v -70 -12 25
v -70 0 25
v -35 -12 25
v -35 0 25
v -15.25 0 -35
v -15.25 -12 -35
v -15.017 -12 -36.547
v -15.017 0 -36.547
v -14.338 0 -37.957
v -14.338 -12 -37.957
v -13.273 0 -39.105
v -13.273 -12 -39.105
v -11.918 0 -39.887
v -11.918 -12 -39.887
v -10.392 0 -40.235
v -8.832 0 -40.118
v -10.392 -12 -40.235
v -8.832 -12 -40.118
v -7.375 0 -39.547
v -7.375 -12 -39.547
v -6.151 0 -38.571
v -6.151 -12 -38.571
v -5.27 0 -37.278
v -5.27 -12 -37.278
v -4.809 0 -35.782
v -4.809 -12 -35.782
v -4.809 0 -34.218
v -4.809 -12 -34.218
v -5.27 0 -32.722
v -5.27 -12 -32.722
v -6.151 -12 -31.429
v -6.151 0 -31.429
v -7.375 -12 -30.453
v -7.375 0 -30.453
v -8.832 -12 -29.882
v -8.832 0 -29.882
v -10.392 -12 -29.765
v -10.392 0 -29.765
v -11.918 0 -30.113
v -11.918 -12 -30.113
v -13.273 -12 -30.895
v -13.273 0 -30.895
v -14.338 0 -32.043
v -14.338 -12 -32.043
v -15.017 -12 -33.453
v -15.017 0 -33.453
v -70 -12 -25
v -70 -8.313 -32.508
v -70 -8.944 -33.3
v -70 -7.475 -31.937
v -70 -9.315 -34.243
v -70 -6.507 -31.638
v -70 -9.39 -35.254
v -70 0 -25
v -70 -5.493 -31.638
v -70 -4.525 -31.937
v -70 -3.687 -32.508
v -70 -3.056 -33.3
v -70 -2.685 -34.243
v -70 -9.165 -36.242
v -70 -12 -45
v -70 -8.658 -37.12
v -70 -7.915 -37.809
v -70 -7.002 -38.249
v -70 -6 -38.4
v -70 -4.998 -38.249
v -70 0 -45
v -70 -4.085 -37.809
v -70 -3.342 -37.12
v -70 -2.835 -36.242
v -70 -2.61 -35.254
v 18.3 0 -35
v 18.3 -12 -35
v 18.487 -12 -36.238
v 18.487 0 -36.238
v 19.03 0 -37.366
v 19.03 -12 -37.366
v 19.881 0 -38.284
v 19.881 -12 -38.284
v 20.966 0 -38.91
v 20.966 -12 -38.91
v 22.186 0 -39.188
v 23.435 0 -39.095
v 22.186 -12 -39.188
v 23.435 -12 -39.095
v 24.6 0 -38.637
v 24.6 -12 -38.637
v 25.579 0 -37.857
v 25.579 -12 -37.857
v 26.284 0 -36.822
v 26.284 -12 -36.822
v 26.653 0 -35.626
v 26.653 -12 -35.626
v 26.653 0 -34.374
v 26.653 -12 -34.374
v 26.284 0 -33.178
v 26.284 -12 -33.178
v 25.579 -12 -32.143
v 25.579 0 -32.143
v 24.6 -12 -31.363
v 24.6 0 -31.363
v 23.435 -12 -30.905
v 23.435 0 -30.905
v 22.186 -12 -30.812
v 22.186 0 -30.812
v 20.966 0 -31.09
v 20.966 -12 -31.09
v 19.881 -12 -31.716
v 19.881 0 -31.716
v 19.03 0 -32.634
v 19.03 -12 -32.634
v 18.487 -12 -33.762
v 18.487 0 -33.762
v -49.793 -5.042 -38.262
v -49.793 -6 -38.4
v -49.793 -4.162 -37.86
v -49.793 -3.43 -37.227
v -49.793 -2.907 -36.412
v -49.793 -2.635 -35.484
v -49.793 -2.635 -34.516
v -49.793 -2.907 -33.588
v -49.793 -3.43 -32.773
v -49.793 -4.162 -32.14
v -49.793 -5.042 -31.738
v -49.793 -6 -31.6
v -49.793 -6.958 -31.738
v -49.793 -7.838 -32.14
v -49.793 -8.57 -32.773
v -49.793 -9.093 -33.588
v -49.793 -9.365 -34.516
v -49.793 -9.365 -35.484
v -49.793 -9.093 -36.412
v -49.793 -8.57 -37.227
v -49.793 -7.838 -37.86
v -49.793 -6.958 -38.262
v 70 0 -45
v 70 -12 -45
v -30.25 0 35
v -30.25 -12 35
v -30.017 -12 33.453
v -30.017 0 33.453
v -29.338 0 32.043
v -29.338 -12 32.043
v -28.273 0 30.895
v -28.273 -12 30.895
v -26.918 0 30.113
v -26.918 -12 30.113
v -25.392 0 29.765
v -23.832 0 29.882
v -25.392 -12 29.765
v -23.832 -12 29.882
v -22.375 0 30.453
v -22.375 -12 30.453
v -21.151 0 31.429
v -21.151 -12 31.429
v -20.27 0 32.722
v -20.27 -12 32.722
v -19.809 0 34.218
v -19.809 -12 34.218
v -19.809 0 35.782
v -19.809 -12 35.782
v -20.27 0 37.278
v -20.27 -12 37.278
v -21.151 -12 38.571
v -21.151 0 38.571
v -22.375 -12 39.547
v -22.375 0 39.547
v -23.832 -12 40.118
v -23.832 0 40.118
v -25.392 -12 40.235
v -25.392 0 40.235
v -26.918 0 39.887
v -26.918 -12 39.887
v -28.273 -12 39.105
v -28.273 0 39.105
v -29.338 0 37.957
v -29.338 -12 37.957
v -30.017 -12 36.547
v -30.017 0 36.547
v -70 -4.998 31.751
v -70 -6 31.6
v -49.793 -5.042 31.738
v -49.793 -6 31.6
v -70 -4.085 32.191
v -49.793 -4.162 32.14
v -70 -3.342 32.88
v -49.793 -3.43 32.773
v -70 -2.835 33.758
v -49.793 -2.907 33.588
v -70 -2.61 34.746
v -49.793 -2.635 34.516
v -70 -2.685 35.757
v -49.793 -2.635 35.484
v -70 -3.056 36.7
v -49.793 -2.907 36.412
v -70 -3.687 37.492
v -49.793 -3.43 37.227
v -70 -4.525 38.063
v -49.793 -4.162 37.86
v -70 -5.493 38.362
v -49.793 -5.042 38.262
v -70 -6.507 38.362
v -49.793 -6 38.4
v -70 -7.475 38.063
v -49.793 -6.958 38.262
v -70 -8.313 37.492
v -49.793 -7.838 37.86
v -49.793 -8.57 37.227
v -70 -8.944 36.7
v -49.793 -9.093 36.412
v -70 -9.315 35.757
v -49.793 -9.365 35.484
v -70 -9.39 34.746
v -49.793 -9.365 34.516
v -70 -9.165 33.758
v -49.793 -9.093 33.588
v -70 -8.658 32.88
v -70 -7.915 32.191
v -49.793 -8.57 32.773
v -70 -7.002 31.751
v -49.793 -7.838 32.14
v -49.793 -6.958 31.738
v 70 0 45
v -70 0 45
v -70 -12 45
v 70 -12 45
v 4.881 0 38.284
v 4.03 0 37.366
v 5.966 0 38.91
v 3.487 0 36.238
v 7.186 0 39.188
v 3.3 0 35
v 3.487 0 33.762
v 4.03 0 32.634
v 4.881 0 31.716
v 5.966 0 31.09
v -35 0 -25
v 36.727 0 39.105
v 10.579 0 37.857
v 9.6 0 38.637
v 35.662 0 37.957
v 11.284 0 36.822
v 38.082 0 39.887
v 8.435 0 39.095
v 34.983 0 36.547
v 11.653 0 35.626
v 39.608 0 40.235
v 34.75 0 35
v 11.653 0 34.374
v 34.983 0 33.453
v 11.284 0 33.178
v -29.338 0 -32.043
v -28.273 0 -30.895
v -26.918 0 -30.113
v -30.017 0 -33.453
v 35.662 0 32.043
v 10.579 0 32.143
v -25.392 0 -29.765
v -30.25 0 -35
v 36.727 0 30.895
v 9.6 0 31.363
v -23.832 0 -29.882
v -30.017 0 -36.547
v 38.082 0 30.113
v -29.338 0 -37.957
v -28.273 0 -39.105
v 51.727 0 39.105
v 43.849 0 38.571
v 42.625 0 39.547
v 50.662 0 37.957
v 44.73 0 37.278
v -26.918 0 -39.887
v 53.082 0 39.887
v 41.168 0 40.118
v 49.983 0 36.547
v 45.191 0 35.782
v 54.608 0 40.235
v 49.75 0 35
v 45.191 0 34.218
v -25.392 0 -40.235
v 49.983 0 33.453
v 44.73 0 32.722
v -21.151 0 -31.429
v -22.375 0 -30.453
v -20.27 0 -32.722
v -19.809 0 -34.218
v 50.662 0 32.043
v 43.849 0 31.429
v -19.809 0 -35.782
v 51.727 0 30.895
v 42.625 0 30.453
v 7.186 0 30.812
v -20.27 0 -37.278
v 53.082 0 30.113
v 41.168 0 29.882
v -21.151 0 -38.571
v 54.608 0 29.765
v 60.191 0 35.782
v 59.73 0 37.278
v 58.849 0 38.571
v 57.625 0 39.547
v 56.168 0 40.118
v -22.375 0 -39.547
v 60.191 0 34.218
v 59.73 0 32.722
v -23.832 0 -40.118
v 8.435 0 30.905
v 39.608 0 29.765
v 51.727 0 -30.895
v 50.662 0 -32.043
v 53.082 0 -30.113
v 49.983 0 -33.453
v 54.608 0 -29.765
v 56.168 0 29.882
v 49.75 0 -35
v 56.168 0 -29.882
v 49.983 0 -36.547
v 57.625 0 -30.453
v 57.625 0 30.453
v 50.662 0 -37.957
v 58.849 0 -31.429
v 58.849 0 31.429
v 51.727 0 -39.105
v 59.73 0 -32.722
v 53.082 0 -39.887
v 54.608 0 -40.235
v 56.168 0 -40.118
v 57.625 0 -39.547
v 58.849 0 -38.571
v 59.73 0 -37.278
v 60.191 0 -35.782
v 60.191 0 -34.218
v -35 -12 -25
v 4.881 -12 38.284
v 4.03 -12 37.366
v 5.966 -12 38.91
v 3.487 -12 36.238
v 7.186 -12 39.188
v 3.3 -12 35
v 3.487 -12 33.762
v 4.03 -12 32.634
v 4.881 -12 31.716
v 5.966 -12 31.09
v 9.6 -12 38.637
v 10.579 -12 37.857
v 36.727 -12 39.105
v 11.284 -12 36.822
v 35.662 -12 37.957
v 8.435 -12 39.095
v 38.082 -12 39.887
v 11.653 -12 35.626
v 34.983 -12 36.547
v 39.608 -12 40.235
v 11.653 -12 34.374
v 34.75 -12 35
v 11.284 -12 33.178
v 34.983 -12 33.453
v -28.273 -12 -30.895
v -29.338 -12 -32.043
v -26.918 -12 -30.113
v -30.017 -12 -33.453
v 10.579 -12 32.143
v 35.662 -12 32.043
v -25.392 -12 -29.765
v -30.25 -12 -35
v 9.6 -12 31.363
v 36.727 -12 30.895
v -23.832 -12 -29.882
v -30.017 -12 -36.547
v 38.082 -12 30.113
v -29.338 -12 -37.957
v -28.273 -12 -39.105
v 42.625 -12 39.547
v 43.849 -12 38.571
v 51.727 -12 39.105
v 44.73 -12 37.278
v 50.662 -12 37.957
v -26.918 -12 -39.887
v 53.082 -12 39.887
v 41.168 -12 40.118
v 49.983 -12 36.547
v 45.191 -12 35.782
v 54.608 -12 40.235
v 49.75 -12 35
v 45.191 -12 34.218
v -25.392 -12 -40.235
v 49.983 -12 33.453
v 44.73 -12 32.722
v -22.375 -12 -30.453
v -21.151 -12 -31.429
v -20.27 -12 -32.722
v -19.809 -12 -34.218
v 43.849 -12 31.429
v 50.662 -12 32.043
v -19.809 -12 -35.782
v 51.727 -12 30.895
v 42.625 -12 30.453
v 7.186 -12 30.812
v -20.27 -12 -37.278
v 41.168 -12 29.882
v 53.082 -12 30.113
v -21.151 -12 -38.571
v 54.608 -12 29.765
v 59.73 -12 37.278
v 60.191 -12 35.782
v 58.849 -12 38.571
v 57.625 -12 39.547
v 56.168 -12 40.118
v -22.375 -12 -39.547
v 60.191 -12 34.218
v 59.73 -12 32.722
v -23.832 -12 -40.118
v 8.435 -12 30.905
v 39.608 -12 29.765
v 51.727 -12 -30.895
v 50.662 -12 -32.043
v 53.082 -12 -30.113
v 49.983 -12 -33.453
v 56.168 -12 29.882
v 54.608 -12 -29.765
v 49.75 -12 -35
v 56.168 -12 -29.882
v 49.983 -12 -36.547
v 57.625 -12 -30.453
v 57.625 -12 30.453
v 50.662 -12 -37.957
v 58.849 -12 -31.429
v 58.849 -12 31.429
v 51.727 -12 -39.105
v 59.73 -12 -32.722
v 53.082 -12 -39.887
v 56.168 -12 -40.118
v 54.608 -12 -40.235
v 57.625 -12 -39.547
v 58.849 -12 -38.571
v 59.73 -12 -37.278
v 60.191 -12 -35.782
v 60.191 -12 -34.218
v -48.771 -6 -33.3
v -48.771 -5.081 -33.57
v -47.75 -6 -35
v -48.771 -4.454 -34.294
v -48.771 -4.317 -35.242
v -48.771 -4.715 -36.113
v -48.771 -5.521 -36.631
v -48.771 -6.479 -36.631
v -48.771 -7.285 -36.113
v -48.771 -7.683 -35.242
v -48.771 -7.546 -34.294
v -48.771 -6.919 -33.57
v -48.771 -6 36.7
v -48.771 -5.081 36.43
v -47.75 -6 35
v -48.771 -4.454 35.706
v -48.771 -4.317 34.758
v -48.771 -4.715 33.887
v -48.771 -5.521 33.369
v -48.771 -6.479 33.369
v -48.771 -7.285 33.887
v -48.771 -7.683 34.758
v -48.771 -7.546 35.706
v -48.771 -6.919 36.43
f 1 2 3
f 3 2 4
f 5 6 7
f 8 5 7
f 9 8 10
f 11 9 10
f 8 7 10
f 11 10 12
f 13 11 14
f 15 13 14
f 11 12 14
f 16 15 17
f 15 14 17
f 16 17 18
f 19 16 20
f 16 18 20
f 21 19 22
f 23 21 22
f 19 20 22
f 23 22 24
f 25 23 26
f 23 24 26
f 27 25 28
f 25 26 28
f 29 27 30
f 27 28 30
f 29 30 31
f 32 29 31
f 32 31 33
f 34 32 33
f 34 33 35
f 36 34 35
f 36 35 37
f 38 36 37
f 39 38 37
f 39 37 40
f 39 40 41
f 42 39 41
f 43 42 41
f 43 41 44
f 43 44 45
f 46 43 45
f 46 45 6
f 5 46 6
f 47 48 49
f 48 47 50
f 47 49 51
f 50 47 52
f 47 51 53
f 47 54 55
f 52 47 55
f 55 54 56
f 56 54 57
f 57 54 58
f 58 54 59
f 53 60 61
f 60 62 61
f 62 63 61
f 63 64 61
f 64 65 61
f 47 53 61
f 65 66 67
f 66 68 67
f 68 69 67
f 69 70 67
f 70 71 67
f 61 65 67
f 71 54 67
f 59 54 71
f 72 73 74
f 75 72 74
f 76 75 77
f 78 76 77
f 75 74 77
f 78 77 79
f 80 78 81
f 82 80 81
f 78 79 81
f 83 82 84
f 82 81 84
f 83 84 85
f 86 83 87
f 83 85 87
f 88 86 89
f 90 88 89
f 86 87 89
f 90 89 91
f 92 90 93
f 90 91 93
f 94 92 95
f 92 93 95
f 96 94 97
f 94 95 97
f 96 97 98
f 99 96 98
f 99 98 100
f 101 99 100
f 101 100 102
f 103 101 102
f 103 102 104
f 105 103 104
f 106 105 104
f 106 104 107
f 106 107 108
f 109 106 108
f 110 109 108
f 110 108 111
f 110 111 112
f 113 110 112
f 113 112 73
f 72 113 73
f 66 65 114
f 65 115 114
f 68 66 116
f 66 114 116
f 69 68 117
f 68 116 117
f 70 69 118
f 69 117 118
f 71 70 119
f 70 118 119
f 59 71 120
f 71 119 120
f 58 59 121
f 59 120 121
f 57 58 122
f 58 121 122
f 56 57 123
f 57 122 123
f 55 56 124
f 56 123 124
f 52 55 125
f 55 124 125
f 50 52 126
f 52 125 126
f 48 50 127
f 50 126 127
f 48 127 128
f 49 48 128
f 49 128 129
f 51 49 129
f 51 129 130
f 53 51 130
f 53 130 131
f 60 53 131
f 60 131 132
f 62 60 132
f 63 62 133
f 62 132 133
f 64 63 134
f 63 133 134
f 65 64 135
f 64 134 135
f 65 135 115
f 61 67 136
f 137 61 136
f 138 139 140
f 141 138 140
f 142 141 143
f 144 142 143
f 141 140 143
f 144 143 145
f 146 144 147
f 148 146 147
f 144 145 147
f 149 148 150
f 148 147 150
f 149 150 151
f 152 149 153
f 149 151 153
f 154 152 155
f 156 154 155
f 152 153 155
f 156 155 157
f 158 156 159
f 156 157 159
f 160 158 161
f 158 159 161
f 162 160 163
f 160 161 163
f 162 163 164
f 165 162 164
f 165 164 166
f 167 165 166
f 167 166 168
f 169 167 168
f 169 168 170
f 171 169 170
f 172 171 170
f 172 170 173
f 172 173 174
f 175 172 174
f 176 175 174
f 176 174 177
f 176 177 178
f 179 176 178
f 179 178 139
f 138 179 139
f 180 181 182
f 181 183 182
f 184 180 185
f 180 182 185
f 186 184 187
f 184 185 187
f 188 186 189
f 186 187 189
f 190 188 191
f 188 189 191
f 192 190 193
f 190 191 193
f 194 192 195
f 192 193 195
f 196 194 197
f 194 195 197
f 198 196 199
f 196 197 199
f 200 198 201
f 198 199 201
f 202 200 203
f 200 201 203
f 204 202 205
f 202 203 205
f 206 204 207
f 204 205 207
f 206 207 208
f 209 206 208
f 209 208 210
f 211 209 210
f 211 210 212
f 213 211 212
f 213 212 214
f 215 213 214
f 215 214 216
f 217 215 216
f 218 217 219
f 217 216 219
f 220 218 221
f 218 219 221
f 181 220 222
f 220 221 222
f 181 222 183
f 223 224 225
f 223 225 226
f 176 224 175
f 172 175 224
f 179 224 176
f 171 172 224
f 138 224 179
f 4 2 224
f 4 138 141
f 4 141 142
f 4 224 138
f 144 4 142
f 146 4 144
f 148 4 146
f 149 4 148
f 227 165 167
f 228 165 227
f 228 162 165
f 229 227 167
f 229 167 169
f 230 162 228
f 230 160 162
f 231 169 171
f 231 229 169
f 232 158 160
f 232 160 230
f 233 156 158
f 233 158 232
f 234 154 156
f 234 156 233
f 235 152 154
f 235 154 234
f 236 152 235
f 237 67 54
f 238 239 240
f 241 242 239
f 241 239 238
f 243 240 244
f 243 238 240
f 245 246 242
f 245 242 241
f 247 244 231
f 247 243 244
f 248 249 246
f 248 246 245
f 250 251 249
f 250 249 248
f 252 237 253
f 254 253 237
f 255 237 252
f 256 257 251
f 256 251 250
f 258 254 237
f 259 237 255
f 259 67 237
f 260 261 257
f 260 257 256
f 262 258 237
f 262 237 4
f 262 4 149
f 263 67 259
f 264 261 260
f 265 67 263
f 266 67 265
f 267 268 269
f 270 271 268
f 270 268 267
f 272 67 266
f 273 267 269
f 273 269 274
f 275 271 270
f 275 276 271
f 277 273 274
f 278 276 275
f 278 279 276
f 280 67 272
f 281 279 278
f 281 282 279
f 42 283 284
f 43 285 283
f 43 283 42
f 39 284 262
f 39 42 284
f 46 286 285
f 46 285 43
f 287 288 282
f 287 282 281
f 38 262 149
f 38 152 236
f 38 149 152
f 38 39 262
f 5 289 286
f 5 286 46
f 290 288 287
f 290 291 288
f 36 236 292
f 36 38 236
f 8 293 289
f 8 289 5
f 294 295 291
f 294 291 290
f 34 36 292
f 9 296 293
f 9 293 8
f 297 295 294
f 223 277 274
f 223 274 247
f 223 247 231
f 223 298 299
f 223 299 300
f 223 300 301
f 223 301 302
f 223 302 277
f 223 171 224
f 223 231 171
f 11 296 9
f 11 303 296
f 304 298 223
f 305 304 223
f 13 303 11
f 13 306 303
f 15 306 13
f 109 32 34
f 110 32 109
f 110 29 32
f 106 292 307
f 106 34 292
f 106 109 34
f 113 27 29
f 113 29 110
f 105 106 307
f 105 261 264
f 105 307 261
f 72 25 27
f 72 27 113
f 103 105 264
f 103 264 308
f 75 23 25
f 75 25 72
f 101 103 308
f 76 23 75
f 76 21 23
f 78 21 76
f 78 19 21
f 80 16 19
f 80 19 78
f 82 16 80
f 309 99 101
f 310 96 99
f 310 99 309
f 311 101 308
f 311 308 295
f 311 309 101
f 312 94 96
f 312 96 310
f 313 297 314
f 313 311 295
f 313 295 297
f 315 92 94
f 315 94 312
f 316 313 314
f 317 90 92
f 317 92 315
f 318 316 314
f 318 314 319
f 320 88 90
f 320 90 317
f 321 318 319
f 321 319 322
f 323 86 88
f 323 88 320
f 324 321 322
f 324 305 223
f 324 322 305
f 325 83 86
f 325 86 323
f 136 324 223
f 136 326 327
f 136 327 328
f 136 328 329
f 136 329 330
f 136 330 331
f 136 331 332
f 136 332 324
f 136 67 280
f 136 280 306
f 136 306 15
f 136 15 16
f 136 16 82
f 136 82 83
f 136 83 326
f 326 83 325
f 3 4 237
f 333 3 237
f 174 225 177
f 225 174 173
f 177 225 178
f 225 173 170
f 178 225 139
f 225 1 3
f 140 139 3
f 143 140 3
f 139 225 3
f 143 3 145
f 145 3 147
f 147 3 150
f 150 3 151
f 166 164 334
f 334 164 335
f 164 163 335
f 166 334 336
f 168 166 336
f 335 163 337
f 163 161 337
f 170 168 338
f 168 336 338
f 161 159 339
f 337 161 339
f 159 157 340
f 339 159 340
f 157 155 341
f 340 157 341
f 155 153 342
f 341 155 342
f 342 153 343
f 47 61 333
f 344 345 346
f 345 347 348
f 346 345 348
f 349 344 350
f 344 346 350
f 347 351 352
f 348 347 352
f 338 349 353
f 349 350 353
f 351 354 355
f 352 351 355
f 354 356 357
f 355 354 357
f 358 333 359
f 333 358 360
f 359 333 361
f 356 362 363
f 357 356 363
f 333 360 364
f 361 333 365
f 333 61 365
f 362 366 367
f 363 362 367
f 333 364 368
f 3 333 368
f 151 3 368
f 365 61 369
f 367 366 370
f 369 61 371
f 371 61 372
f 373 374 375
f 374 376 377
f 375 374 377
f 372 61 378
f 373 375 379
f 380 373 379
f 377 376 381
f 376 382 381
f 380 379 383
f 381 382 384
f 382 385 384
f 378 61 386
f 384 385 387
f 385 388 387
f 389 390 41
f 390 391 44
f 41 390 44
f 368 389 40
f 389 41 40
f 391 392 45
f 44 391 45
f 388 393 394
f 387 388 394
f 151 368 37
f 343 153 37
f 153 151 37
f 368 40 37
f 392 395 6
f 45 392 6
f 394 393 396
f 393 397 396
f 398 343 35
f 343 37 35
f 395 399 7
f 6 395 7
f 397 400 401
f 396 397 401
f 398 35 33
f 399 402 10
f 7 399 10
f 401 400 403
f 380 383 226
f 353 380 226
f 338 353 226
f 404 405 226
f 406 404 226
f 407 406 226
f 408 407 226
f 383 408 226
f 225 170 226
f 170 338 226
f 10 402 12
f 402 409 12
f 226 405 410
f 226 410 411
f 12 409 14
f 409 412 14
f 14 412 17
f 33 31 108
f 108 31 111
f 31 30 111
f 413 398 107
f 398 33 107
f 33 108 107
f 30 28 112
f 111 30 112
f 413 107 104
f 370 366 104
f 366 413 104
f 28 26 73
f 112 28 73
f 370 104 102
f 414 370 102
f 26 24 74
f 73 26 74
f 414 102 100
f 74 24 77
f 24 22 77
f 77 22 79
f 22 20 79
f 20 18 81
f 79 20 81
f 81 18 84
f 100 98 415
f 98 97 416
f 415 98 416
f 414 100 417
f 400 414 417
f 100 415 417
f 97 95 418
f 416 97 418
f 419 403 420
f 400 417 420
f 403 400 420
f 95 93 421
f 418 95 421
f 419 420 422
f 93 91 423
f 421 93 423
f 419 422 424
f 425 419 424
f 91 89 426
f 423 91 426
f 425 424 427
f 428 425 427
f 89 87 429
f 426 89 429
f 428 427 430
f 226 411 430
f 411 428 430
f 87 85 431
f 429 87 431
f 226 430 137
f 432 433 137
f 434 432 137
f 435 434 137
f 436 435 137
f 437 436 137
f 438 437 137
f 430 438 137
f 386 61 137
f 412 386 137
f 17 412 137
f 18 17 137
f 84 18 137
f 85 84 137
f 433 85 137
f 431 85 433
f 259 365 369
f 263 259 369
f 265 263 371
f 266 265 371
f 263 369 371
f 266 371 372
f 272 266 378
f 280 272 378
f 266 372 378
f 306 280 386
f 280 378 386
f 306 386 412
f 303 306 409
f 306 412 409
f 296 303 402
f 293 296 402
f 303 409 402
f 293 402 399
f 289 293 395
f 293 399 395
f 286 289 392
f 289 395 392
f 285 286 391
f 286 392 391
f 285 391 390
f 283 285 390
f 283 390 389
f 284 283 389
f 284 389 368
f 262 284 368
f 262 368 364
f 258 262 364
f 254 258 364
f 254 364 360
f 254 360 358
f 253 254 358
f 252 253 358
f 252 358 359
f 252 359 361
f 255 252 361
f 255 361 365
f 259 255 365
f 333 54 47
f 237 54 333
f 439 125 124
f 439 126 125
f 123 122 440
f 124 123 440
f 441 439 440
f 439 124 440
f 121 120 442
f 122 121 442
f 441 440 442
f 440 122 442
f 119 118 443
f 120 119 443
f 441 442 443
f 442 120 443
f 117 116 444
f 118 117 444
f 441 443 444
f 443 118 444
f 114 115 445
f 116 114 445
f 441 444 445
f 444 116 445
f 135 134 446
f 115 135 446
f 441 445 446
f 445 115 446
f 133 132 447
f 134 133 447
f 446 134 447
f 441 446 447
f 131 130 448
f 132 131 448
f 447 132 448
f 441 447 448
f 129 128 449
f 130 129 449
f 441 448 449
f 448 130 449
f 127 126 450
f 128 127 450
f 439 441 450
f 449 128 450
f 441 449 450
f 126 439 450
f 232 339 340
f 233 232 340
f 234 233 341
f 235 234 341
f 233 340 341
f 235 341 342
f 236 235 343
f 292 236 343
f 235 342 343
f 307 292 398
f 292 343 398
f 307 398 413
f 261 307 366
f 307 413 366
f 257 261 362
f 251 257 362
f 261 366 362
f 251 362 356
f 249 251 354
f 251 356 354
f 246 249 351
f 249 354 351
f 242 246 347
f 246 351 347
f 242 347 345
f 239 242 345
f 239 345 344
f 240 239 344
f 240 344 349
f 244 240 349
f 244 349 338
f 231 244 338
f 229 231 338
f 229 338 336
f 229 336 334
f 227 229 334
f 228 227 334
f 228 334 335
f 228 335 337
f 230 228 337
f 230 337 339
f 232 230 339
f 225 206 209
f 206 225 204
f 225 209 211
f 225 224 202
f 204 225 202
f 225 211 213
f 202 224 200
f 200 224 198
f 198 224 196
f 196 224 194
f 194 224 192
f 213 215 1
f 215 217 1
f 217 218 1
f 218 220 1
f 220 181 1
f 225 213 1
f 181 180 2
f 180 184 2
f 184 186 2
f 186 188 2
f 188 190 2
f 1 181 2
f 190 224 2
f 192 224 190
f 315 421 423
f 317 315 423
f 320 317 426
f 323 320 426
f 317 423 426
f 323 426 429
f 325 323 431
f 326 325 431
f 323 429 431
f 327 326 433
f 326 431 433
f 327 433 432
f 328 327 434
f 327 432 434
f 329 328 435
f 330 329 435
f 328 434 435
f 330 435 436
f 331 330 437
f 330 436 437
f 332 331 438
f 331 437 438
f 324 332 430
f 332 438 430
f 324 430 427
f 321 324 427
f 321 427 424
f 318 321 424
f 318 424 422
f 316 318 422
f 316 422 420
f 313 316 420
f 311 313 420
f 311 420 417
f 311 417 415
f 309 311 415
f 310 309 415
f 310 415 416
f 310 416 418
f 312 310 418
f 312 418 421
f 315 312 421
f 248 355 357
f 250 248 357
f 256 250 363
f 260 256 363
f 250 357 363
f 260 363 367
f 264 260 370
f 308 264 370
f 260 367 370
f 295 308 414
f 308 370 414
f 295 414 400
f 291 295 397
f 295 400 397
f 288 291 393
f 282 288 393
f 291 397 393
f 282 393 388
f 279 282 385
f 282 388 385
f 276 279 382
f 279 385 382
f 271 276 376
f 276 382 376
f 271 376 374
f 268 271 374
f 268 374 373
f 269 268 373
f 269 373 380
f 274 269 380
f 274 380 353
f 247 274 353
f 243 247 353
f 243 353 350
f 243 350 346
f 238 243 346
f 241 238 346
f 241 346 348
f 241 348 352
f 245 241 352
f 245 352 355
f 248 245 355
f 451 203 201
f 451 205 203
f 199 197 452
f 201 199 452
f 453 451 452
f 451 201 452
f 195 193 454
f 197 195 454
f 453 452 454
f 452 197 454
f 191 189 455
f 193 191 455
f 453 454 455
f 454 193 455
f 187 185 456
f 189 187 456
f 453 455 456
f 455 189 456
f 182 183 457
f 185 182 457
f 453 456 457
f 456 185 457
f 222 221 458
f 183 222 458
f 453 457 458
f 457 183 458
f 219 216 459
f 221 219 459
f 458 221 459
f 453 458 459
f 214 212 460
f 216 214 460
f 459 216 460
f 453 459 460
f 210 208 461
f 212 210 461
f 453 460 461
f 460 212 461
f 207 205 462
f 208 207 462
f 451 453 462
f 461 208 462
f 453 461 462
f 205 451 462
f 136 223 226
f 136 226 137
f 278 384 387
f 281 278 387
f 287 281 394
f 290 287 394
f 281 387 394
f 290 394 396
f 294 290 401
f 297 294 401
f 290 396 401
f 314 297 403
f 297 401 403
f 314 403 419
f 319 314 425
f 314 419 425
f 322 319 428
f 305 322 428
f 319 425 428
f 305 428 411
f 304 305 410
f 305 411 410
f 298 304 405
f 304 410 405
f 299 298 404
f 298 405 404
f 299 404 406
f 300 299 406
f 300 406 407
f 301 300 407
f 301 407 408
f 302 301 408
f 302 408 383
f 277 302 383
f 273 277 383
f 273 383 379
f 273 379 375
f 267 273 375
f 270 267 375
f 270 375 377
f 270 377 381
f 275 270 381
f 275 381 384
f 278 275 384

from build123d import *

# Parameters (mm, degrees)
SKETCH1_W                    = 140
SKETCH1_H                    = 90
BOSS_EXTRUDE1_DEPTH          = 12
CUT_EXTRUDE1_REACH           = 86.077
SKETCH2_W                    = 35
SKETCH2_H                    = 50
M10_CLEARANCE_HOLE1_D        = 10.5
F_10_5_10_5_DIAMETER_HOLE1_D = 10.5
M8_TAPPED_HOLE1_D            = 6.8
M8_TAPPED_HOLE1_DEPTH        = 20.207073895
M8_TAPPED_HOLE1_TIP          = 2.042926105
M8_CLEARANCE_HOLE1_D         = 8.4


with BuildPart() as part:
    # Sketch1 → Boss-Extrude1 (new body)
    with BuildSketch(Plane(origin=(0, 0, 0), x_dir=(1, 0, 0), z_dir=(0, 1, 0))):
        Rectangle(SKETCH1_W, SKETCH1_H)
    extrude(amount=-BOSS_EXTRUDE1_DEPTH)

    # Sketch2 → Cut-Extrude1 (cut, up to next)
    with BuildSketch(Plane(origin=(0, 0, 0), x_dir=(1, 0, 0), z_dir=(0, 1, 0)), mode=Mode.PRIVATE) as cut_extrude1_sk1:
        with Locations((-52.5, 0)):
            Rectangle(SKETCH2_W, SKETCH2_H)
    cut_extrude1_tool1 = extrude(cut_extrude1_sk1.sketch, amount=-CUT_EXTRUDE1_REACH, mode=Mode.PRIVATE) & part.part
    add(cut_extrude1_tool1.solids().sort_by_distance((-52.5, 0, 0))[0], mode=Mode.SUBTRACT)

    # M10 Clearance Hole1 (through all)
    with Locations(Plane(origin=(0, 0, 0), x_dir=(1, 0, 0), z_dir=(0, 1, 0))):
        with Locations((-10, 35), (55, 35), (40, -35), (-25, -35)):
            Hole(M10_CLEARANCE_HOLE1_D / 2)

    # Ø10.5 (10.5) Diameter Hole1 (through all)
    with Locations(Plane(origin=(0, 0, 0), x_dir=(1, 0, 0), z_dir=(0, 1, 0))):
        with Locations((-25, 35), (55, -35)):
            Hole(F_10_5_10_5_DIAMETER_HOLE1_D / 2)

    # M8 Tapped Hole1
    with Locations(Plane.ZY.offset(70)):
        with Locations((35, -6), (-35, -6)):
            Hole(M8_TAPPED_HOLE1_D / 2, depth=M8_TAPPED_HOLE1_DEPTH)
            with Locations((0, 0, -(M8_TAPPED_HOLE1_DEPTH + M8_TAPPED_HOLE1_TIP / 2))):  # 118° drill point
                Cone(0, M8_TAPPED_HOLE1_D / 2, M8_TAPPED_HOLE1_TIP, mode=Mode.SUBTRACT)

    # M8 Clearance Hole1 (through all)
    with Locations(Plane(origin=(0, 0, 0), x_dir=(1, 0, 0), z_dir=(0, 1, 0))):
        with Locations((22.5, 35), (7.5, -35)):
            Hole(M8_CLEARANCE_HOLE1_D / 2)


solid = part.part
